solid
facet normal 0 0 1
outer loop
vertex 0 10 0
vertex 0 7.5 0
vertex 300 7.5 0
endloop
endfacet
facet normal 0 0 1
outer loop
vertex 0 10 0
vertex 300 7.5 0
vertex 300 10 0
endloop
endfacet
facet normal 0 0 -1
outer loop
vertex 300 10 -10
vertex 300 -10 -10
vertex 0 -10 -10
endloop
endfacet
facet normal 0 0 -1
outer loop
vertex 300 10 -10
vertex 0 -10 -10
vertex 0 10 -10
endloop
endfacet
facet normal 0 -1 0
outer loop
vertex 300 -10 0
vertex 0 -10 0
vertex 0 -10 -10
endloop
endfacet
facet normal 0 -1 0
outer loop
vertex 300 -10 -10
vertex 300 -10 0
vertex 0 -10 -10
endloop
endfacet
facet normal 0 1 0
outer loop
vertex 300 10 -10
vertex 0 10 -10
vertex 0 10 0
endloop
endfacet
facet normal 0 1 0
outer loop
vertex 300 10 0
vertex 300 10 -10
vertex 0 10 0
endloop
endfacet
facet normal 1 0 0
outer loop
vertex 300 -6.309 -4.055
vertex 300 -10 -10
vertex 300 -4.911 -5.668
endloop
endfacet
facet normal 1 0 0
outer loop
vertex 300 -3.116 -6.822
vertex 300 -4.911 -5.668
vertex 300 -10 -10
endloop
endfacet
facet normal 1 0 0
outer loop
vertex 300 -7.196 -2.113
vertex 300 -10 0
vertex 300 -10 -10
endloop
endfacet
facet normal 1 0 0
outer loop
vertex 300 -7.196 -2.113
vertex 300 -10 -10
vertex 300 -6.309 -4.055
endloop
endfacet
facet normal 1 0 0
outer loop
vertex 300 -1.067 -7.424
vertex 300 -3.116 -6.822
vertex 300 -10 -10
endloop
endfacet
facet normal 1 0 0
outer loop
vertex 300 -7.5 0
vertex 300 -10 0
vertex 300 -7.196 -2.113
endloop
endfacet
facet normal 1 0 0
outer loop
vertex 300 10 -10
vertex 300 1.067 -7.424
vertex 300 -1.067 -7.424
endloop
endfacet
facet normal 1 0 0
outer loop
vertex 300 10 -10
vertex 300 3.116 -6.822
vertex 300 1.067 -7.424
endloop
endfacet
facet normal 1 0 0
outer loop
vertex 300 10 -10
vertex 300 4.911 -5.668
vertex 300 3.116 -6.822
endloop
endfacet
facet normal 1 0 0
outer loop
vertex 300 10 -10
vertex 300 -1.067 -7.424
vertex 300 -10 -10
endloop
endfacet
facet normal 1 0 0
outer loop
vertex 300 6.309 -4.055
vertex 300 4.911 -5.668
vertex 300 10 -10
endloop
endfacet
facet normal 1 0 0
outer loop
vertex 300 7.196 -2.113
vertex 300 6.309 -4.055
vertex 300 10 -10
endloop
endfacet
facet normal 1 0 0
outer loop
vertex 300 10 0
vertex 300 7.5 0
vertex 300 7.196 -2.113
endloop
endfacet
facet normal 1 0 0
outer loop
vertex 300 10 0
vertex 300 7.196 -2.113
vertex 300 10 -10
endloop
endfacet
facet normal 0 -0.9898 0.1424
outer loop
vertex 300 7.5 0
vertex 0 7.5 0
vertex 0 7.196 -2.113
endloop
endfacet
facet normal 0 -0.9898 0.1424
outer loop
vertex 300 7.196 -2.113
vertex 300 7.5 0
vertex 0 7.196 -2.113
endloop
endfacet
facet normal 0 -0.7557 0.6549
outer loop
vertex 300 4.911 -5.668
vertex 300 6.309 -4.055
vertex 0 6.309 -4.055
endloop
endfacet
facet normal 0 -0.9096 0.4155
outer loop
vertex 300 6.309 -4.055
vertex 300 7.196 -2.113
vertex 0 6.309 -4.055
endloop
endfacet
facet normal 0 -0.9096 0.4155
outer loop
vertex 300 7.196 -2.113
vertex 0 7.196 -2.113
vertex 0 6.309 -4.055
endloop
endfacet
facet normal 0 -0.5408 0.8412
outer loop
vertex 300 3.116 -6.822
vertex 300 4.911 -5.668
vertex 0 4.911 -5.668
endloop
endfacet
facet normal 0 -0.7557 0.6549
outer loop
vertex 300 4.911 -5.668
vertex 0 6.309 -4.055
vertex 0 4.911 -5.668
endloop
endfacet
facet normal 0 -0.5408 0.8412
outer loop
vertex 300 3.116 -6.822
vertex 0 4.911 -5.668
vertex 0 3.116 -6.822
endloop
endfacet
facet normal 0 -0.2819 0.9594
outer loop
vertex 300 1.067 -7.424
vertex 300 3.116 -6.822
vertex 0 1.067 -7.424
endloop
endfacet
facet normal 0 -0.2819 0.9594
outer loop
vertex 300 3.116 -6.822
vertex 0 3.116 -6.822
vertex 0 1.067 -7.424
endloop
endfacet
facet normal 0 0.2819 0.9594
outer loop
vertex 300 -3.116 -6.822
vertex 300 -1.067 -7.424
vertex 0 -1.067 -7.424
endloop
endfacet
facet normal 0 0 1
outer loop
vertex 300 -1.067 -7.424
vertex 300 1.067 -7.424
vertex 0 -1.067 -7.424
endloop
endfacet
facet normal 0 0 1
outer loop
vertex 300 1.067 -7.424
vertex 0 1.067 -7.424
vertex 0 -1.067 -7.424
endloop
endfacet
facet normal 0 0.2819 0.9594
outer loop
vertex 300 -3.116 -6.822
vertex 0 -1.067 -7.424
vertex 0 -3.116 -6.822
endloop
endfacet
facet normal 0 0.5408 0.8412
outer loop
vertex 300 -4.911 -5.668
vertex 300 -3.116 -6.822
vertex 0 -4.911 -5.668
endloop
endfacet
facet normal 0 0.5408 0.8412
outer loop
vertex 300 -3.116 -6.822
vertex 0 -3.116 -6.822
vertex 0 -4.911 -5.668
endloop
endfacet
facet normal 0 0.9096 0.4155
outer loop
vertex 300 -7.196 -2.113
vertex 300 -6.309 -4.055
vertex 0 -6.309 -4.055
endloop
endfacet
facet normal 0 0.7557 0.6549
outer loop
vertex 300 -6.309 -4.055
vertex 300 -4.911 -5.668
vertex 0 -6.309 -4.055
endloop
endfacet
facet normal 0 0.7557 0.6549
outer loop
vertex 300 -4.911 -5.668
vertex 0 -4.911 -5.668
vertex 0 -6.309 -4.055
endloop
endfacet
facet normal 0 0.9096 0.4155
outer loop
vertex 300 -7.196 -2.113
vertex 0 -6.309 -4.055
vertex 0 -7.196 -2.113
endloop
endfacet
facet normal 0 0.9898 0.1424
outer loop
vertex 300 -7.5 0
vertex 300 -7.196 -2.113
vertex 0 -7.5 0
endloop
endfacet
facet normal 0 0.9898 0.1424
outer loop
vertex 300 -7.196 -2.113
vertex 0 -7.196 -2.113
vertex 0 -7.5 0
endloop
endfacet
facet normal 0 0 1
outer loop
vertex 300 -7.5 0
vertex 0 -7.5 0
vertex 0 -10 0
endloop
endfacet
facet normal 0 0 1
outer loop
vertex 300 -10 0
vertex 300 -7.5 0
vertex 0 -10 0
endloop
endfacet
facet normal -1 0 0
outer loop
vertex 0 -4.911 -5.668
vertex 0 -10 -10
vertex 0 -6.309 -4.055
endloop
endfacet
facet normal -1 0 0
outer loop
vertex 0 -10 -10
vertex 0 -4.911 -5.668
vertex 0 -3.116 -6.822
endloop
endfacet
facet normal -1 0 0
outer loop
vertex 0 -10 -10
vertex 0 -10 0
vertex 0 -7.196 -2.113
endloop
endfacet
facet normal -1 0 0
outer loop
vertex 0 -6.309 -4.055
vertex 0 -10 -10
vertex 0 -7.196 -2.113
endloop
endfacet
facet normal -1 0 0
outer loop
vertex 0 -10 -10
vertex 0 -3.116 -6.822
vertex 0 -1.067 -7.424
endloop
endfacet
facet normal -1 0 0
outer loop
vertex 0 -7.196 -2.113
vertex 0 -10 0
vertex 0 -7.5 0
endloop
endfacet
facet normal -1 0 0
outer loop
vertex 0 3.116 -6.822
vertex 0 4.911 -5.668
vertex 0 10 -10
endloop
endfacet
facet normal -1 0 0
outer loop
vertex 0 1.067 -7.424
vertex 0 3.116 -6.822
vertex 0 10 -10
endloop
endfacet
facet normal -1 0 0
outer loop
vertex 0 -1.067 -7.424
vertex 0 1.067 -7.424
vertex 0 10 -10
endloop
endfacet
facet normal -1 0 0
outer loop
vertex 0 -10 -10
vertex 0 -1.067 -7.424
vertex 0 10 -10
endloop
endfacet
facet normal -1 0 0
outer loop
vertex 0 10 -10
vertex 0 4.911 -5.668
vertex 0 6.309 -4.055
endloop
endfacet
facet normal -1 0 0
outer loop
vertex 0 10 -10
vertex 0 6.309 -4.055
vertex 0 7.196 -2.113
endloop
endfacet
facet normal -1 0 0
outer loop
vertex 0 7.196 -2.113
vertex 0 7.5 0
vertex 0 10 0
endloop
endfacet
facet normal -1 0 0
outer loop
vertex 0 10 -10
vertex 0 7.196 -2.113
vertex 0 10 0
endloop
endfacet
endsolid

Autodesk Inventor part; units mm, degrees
ref_plane "YZ Plane" through (0, 0, 0) normal (1, 0, 0) x (0, 1, 0)
ref_plane "XZ Plane" through (0, 0, 0) normal (0, 1, 0) x (-1, 0, 0)
ref_plane "XY Plane" through (0, 0, 0) normal (0, 0, 1) x (1, 0, 0)
sketch "Skizze1" plane through (0, 0, 0) normal (1, 0, 0) x (0, 1, 0)
  arc A0 (-7.5, 0) -> (7.5, 0) centre (0, 0) ccw
  line L0 (-7.5, 0) -> (-10, 0)
  line L1 (-10, 0) -> (-10, -10)
  line L2 (-10, -10) -> (10, -10)
  line L3 (10, -10) -> (10, 0)
  line L4 (0, -12) -> (0, 2) projected
  line L5 (7.5, 0) -> (10, 0)
  line L6 (-14, 0) -> (14, 0) projected
  dimension "d0" = 20
  dimension "d1" = 7.5
  dimension "d2" = 10
extrude "Extrusion1" add sketch "Skizze1" along normal blind 300 contours A0 L4 L2 L1 L0 | A0 L5 L3 L2 L4
properties part number "Gerade_1"
